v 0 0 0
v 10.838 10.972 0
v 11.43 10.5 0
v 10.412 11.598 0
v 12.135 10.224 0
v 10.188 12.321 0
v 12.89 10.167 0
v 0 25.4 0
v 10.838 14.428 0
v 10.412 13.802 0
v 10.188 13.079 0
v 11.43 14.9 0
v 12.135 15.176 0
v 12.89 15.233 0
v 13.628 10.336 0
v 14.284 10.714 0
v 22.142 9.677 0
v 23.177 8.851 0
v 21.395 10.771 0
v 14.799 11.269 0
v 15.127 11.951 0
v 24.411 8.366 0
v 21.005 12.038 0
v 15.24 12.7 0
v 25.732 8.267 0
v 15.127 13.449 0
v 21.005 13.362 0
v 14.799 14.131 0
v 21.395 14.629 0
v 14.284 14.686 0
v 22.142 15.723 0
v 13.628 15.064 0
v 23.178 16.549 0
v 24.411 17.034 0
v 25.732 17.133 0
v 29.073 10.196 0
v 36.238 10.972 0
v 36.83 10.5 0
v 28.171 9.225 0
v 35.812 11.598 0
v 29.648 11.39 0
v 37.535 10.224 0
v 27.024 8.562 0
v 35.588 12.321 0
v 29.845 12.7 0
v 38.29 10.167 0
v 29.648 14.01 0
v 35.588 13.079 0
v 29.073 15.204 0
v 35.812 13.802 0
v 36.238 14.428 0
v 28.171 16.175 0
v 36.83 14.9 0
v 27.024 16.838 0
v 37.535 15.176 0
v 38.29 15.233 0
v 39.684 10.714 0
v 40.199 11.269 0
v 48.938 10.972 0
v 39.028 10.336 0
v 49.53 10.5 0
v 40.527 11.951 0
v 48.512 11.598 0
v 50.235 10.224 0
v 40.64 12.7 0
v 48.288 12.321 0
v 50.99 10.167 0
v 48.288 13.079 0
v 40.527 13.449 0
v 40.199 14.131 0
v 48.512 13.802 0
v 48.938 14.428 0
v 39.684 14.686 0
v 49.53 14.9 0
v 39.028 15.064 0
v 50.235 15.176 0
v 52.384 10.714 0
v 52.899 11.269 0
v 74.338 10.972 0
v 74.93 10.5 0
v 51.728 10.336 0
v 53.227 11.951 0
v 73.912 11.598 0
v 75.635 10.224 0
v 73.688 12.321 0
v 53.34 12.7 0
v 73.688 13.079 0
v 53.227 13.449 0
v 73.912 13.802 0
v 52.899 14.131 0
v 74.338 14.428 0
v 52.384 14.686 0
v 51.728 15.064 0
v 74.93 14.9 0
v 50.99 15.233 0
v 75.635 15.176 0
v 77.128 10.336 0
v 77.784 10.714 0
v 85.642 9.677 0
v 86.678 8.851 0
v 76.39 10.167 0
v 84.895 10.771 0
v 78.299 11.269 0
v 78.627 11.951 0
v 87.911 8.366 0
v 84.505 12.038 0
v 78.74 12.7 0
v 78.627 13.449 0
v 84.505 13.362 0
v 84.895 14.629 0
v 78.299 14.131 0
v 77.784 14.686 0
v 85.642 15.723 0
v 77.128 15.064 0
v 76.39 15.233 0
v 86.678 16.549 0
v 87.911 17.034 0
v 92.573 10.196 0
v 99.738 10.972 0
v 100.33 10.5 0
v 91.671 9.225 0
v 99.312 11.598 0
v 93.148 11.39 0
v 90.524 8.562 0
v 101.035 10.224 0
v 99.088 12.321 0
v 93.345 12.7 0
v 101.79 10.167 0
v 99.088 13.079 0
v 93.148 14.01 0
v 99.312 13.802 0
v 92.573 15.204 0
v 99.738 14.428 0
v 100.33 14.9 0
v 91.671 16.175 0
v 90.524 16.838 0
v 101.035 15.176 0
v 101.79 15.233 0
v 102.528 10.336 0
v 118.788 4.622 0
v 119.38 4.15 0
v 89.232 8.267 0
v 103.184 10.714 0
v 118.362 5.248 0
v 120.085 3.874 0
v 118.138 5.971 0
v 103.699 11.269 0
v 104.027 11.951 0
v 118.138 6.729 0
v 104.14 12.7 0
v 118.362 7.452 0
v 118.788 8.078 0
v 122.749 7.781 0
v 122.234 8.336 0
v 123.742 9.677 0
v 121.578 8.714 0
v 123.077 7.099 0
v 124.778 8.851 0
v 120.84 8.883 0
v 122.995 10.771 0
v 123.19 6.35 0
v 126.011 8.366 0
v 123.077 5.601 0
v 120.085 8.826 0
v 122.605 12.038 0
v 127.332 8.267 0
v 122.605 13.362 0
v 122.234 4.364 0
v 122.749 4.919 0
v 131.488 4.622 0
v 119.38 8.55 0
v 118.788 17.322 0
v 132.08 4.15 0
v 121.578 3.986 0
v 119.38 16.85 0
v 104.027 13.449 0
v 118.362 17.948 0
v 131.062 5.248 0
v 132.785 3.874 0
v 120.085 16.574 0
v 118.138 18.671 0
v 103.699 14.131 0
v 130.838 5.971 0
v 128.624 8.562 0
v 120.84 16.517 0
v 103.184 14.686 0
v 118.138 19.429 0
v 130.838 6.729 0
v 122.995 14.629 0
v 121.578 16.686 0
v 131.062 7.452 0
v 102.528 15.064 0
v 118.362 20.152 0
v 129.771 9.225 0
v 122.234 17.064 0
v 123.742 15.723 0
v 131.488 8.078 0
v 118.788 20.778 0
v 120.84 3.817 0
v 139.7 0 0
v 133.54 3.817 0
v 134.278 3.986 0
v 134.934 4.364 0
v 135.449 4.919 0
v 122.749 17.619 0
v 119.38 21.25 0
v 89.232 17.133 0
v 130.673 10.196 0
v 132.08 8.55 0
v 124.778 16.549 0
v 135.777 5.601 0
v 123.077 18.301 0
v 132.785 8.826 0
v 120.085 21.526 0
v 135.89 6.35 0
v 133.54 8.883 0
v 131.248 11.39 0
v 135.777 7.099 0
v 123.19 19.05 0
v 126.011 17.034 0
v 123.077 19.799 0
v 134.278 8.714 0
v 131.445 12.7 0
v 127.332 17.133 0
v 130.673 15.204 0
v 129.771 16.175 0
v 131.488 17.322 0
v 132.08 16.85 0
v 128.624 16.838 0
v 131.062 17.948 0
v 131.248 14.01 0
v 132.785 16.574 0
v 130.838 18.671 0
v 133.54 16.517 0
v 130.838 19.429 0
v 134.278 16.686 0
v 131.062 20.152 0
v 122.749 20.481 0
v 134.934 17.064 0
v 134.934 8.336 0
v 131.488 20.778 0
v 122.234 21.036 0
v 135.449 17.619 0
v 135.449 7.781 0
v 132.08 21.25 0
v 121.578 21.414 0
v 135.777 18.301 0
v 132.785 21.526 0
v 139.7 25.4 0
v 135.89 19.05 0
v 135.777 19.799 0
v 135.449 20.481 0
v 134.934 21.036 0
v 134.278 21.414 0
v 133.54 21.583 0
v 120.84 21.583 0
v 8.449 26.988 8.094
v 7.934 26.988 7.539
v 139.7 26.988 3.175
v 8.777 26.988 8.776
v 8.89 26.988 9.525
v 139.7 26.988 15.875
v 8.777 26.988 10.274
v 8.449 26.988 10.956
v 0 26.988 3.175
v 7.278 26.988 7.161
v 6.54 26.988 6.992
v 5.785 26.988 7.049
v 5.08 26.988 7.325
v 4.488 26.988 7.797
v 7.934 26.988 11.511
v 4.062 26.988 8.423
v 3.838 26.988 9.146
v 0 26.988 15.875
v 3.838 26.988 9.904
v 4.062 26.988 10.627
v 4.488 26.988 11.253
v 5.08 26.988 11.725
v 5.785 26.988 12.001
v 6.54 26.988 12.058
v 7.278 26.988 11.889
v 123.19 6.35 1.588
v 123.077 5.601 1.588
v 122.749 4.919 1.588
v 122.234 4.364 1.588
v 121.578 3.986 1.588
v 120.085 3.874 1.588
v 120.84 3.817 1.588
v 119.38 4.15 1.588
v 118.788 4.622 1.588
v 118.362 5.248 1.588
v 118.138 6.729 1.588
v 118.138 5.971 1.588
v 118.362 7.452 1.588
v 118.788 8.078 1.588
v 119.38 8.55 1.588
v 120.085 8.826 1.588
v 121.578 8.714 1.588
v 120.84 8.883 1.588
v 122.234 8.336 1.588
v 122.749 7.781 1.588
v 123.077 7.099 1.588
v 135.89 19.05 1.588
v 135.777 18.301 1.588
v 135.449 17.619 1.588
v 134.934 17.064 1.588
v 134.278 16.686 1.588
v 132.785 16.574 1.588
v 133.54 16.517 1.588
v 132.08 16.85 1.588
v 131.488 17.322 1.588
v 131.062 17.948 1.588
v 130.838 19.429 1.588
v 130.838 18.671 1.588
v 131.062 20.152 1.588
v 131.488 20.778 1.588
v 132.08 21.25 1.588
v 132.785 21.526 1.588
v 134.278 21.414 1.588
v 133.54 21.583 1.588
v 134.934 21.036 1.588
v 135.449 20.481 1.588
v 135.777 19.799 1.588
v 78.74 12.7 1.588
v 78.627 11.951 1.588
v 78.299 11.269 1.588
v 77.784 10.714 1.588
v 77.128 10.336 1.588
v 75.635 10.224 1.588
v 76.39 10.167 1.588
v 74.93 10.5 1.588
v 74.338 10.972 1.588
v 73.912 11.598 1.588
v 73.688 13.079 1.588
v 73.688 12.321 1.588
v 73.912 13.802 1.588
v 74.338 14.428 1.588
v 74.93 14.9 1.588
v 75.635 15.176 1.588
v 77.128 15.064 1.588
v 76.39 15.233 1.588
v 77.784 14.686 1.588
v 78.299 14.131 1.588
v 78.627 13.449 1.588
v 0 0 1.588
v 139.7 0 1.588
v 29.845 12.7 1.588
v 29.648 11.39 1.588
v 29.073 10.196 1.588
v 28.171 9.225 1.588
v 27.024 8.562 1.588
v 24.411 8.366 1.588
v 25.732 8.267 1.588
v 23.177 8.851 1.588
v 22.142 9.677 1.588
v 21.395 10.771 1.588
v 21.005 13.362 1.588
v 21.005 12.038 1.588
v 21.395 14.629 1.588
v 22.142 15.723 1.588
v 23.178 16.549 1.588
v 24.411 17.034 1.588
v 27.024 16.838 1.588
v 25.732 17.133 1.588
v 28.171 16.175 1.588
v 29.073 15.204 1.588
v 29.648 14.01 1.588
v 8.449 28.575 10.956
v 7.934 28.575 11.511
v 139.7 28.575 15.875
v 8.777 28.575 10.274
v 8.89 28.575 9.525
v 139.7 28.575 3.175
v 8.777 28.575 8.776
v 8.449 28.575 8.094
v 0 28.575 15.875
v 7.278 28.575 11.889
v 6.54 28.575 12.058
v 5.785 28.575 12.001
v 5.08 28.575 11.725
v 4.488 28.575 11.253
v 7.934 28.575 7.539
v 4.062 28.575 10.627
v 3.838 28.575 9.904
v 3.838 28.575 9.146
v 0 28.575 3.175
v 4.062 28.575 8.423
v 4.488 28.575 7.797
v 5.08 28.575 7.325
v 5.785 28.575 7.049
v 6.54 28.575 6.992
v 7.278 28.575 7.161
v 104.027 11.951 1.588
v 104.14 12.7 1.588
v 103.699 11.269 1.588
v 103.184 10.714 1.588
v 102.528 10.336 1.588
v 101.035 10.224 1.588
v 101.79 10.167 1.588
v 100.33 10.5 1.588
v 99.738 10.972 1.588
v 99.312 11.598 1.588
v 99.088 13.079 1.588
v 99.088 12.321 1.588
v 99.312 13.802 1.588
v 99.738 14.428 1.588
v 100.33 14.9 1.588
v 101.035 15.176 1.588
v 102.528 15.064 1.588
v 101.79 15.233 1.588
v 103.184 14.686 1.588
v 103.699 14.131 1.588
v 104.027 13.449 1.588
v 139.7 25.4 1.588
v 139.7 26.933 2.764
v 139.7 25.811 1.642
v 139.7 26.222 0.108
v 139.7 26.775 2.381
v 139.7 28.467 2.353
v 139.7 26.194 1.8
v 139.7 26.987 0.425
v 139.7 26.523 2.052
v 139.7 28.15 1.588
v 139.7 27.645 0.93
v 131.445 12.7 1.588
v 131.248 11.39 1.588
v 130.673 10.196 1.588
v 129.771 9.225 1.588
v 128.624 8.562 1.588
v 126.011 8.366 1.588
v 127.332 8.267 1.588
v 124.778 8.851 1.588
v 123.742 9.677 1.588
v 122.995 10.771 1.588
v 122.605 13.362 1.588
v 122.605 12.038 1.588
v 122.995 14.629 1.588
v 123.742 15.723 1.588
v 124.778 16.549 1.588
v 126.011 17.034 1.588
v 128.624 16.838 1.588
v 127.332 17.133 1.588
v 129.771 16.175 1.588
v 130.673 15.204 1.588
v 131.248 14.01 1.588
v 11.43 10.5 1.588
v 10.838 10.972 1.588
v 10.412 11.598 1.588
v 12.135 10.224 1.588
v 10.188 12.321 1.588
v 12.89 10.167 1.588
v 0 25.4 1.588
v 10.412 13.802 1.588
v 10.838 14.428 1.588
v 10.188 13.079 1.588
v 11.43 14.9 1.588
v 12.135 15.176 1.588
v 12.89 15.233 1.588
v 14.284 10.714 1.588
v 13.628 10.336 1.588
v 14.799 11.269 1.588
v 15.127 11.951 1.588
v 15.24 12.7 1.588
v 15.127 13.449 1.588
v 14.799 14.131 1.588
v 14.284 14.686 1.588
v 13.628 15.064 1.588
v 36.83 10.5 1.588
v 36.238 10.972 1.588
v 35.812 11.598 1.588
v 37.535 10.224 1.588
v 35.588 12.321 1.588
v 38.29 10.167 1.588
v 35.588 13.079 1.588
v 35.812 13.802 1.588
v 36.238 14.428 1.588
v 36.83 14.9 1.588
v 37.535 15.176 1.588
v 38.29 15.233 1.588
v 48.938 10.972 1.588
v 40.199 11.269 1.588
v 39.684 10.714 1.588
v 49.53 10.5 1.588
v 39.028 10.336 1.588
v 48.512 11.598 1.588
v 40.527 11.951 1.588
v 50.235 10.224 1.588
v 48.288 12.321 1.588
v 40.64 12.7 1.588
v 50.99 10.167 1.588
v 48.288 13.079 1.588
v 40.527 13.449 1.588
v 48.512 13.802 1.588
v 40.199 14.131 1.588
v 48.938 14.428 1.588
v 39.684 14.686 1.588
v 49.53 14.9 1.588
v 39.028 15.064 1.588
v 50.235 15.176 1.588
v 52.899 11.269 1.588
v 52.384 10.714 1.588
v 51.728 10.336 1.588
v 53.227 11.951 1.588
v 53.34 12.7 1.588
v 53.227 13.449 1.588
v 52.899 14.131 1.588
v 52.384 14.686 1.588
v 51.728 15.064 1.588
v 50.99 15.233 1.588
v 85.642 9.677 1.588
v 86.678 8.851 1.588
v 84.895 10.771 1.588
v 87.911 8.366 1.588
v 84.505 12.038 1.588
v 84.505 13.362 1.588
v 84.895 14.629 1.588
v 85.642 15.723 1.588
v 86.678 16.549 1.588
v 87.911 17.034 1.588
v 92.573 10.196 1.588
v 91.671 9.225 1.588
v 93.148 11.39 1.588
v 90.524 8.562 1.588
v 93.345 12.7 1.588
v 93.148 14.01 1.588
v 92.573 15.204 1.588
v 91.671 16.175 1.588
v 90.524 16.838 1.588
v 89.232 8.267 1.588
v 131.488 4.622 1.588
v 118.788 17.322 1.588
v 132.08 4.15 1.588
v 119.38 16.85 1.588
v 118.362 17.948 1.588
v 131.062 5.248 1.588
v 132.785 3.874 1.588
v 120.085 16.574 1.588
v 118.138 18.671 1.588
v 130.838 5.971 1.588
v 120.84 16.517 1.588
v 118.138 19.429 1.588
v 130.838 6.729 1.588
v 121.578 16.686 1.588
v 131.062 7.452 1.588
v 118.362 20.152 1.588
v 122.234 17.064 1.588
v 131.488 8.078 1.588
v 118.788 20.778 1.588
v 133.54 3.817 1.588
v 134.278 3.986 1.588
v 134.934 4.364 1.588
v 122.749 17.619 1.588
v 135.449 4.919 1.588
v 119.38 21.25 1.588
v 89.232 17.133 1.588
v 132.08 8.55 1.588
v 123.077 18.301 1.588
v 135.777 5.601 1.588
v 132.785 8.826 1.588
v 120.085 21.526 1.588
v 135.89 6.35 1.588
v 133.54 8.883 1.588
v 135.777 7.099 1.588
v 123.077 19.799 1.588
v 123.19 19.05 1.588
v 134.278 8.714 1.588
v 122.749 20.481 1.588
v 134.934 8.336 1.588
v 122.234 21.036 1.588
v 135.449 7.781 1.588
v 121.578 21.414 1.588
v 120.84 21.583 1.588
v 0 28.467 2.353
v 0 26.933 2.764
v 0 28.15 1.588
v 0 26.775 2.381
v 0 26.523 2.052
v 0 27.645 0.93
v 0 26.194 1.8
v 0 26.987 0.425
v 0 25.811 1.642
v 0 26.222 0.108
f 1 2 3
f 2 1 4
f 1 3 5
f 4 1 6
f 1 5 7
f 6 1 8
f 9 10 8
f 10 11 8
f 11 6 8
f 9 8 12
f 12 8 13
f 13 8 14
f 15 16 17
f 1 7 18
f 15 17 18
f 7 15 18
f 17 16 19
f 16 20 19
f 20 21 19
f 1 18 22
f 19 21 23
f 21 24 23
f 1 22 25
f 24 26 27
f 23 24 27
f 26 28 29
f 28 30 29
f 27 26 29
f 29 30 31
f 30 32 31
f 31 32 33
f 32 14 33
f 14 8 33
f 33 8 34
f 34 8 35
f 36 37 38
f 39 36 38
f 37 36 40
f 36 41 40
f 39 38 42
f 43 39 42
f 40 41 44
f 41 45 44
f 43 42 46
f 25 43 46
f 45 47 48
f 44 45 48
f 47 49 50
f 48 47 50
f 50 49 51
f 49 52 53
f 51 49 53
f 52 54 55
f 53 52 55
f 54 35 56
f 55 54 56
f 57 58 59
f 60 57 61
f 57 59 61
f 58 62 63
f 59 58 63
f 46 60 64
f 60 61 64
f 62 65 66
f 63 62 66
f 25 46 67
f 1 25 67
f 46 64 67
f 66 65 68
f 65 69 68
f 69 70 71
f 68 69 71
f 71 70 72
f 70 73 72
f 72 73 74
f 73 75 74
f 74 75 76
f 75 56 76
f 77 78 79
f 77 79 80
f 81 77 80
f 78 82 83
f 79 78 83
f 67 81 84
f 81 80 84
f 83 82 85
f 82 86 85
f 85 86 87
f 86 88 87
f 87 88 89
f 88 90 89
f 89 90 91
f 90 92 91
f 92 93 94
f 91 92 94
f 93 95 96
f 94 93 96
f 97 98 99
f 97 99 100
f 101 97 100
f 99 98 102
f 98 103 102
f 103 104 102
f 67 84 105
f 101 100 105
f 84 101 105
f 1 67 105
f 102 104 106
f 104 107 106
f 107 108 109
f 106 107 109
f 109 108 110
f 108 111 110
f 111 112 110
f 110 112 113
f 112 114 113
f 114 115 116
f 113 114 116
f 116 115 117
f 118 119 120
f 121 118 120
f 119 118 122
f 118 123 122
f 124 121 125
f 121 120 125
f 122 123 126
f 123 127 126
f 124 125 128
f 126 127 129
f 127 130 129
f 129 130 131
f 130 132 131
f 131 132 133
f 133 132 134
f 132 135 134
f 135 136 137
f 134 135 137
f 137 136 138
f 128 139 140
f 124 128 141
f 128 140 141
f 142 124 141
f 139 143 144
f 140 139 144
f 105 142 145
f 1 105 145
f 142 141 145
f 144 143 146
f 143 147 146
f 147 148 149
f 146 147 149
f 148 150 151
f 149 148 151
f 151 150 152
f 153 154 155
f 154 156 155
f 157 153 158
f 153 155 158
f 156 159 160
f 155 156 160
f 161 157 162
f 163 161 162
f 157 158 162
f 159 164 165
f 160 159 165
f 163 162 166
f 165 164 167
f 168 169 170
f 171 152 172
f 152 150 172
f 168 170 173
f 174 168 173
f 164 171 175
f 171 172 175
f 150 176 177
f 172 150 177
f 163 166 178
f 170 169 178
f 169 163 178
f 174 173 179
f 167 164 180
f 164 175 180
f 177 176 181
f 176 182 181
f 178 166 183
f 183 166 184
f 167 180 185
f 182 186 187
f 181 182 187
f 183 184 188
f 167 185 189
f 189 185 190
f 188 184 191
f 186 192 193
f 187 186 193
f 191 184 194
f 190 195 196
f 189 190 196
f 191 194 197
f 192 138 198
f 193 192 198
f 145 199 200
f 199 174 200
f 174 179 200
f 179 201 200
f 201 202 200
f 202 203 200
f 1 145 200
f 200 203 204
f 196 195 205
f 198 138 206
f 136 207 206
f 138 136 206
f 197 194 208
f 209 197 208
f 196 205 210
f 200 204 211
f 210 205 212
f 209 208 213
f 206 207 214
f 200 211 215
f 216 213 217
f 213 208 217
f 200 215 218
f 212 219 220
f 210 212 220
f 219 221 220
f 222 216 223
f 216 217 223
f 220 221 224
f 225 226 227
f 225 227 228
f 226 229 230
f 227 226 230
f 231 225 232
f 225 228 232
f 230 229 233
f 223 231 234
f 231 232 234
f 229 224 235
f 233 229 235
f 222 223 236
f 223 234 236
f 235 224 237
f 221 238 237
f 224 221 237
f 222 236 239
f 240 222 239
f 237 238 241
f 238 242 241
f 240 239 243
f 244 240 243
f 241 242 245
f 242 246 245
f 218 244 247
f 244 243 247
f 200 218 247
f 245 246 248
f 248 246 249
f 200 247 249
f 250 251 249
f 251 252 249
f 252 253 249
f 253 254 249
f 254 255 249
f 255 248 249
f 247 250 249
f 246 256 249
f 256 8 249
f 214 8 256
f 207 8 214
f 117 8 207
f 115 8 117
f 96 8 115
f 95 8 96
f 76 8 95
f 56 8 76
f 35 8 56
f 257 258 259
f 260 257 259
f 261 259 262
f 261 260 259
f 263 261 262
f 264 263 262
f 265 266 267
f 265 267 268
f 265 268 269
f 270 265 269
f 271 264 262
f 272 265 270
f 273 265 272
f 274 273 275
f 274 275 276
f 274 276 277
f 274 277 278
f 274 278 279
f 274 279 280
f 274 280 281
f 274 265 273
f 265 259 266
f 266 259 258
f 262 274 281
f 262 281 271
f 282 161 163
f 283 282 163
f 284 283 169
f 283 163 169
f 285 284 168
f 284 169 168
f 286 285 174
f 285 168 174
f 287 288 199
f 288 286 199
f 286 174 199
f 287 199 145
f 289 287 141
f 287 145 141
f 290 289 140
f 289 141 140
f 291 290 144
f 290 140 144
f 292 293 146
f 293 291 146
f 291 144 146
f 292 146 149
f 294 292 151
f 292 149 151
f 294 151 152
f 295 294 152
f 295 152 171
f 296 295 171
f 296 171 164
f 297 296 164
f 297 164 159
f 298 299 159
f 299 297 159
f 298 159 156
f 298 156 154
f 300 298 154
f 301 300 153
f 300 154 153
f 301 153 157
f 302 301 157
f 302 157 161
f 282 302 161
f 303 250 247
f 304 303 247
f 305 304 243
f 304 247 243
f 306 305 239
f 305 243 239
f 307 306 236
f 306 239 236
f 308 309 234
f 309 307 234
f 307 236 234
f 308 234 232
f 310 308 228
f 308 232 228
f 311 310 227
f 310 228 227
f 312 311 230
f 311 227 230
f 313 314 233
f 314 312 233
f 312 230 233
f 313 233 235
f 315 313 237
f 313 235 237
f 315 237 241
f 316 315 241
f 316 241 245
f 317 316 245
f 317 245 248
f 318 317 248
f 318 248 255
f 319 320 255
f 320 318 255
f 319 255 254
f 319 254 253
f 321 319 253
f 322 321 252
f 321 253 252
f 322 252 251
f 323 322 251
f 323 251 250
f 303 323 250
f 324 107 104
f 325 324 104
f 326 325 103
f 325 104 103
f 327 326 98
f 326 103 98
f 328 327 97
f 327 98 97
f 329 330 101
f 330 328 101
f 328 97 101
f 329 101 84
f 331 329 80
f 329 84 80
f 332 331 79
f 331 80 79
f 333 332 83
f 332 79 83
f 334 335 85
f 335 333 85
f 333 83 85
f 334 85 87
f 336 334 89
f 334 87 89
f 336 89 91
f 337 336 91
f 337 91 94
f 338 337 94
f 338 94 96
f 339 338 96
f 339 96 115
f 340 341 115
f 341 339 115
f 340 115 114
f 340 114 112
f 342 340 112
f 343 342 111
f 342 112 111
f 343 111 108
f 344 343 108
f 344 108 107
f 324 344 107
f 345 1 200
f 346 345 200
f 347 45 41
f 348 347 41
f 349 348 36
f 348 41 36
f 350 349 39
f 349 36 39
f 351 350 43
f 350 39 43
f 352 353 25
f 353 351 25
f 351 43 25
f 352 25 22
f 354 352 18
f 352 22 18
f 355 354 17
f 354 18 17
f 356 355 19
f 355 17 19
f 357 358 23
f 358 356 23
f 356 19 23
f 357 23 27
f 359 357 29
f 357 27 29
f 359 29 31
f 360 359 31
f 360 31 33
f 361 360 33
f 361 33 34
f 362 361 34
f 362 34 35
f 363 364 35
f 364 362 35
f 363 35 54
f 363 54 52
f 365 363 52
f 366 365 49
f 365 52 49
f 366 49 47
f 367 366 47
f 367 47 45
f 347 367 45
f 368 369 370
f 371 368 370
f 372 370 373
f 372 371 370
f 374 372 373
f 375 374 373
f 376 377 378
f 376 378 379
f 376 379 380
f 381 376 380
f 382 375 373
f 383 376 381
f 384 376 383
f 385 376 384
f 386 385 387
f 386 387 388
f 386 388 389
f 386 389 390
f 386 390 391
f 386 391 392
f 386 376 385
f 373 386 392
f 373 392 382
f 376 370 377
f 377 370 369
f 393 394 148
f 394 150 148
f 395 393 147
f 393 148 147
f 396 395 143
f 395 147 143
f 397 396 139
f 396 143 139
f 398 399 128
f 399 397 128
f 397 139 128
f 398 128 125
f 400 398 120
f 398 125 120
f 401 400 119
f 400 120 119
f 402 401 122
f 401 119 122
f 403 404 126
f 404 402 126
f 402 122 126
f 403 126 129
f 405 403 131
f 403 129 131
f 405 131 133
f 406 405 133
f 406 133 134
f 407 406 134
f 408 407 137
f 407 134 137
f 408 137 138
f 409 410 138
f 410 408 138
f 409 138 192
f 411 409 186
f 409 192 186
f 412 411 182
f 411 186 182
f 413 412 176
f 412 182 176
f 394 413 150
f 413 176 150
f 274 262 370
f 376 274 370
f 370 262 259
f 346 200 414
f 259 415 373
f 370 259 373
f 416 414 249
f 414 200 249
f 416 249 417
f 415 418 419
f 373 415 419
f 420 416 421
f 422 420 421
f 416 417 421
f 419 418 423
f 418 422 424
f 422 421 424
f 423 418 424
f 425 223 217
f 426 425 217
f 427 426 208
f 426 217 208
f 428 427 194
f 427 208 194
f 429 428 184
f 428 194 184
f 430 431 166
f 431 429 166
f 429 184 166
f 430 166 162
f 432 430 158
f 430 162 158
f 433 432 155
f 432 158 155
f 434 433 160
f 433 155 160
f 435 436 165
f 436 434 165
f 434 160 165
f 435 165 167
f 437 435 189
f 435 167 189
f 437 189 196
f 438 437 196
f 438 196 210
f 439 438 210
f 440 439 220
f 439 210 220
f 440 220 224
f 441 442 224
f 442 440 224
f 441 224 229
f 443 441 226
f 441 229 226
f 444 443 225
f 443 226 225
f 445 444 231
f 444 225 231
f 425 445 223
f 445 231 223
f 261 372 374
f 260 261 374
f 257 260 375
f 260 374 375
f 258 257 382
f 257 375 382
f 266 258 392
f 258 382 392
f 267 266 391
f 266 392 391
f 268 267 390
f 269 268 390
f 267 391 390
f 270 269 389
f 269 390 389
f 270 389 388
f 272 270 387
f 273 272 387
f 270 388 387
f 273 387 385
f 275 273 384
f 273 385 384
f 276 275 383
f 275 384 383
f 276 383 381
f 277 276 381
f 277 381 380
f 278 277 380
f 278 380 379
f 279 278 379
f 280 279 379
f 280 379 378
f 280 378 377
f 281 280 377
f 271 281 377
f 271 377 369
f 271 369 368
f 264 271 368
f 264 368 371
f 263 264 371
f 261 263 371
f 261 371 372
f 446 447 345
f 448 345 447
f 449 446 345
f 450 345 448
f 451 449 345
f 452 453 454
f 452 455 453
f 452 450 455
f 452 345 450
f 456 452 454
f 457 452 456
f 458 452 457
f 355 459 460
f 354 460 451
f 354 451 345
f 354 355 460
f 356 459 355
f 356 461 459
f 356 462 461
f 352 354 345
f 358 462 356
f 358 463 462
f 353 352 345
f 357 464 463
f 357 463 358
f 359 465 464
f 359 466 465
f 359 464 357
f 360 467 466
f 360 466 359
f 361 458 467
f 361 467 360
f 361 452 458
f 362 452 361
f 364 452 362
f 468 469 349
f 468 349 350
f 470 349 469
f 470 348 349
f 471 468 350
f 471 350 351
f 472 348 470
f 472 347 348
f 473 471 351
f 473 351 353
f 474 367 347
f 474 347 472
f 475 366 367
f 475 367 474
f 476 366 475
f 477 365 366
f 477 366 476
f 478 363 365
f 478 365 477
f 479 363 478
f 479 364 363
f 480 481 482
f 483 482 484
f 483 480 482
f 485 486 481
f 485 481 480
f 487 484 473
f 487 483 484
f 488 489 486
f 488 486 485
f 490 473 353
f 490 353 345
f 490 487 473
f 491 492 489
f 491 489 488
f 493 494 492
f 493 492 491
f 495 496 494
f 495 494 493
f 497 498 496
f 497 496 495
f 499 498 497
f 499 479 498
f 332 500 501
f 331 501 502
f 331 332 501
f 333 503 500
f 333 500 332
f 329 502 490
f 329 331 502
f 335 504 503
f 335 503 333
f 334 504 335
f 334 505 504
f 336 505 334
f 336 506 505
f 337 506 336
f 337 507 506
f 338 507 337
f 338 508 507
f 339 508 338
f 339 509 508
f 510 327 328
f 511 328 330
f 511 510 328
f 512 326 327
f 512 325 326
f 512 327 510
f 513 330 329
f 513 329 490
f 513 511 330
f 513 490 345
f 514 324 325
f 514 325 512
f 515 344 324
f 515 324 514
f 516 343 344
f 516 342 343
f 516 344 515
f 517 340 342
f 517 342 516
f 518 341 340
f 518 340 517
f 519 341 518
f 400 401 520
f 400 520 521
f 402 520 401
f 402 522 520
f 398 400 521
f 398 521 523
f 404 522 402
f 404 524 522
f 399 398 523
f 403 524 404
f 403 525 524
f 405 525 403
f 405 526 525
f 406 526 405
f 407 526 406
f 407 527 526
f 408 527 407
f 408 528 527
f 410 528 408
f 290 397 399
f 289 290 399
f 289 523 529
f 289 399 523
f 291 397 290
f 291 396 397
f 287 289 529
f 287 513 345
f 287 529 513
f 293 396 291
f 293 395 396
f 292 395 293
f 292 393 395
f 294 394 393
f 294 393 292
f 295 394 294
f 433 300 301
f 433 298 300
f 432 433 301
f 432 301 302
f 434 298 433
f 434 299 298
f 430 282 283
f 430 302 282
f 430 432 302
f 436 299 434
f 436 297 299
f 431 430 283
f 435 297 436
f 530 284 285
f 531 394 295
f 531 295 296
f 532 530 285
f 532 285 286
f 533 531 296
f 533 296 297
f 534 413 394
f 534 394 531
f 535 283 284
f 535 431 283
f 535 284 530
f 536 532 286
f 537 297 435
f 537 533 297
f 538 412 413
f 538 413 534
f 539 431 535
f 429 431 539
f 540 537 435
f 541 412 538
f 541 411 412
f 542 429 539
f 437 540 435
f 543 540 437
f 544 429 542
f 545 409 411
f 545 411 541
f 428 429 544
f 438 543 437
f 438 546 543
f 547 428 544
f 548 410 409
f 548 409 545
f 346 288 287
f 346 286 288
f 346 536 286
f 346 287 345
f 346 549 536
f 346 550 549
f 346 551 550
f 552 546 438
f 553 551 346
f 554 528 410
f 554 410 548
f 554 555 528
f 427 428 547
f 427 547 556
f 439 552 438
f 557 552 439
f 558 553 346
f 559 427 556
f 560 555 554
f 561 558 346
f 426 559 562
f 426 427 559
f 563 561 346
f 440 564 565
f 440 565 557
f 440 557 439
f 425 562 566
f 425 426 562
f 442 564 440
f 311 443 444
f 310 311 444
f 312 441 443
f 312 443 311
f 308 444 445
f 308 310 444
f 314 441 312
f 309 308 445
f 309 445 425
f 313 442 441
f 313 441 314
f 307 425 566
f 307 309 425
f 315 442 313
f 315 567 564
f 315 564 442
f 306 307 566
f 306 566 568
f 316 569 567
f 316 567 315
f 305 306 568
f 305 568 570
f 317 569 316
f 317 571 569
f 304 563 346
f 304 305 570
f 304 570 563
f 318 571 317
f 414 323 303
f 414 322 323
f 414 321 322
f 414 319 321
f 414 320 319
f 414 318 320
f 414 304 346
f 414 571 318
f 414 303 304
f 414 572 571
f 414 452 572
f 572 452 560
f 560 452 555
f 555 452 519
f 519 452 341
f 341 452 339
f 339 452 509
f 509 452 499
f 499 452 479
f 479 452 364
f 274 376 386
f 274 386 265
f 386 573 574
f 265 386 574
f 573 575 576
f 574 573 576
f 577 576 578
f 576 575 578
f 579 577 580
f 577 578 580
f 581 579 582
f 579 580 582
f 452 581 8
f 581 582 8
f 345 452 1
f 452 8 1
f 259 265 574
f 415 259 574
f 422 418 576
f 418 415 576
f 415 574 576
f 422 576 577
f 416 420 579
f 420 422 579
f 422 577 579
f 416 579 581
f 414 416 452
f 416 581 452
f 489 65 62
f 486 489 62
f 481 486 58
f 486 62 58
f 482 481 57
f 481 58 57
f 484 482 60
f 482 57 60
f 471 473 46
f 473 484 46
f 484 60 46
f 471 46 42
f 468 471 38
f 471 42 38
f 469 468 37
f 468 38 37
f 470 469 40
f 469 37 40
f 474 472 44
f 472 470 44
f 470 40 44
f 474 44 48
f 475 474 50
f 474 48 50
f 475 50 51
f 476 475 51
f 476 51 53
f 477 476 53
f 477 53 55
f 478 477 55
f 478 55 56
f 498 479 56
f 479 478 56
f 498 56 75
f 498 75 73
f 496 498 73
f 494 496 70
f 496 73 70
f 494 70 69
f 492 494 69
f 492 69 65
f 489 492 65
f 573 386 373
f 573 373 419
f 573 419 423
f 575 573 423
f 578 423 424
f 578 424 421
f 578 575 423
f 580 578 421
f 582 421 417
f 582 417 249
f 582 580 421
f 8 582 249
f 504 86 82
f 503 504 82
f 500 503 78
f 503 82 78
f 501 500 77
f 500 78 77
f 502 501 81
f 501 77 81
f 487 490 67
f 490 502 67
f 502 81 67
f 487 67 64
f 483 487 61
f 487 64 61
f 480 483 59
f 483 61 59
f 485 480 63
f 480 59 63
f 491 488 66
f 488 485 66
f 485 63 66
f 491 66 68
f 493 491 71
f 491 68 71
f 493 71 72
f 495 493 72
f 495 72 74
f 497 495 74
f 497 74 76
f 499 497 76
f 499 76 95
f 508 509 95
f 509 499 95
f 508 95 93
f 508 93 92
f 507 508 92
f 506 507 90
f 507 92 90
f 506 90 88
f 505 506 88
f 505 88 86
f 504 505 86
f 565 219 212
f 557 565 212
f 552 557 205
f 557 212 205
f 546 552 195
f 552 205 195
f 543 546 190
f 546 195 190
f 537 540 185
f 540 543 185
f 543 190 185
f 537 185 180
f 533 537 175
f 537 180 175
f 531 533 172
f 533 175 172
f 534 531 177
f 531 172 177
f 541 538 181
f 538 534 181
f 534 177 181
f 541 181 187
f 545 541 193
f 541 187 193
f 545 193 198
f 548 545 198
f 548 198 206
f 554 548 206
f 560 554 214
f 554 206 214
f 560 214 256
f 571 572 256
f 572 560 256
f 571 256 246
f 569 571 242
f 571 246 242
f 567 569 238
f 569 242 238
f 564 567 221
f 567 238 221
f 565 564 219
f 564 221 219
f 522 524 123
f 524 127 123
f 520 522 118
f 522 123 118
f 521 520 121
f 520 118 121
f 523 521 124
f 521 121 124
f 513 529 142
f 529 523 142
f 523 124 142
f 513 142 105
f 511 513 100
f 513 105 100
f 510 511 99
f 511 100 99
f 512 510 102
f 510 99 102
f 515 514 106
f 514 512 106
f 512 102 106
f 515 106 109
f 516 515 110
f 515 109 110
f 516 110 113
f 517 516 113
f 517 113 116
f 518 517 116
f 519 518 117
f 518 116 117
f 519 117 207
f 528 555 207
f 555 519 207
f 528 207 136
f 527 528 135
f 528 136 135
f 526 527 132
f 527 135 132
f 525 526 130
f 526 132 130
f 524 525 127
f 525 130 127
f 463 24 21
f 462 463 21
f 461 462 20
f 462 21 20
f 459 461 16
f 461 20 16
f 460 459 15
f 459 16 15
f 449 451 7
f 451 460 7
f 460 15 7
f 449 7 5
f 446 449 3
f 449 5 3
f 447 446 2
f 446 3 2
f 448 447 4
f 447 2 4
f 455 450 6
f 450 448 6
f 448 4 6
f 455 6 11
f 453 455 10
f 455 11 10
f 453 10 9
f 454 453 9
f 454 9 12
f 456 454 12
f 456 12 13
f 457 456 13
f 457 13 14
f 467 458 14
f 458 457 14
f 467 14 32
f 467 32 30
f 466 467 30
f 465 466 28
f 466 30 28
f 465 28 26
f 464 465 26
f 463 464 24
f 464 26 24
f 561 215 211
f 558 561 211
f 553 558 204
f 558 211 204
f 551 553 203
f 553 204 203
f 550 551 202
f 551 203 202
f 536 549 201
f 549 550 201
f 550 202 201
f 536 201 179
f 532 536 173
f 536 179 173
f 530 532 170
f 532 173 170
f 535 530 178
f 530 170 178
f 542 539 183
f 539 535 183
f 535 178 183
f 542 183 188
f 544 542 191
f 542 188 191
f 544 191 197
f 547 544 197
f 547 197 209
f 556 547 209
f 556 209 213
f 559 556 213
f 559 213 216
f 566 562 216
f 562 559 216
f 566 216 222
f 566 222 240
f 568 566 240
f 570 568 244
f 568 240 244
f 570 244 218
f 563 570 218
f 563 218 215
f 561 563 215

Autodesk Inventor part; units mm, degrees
ref_plane "YZ Plane" through (0, 0, 0) normal (1, 0, 0) x (0, 1, 0)
ref_plane "XZ Plane" through (0, 0, 0) normal (0, 1, 0) x (-1, 0, 0)
ref_plane "XY Plane" through (0, 0, 0) normal (0, 0, 1) x (1, 0, 0)
sketch "Sketch1" plane through (0, 0, 0) normal (0, 0, 1) x (1, 0, 0)
  line L0 (0, 0) -> (139.7, 0)
  line L1 (139.7, 0) -> (139.7, 25.4)
  line L2 (139.7, 25.4) -> (0, 25.4)
  line L3 (0, 25.4) -> (0, 0)
  circle A0 centre (12.7, 12.7) radius 2.54
  circle A1 centre (25.4, 12.7) radius 4.445
  circle A2 centre (38.1, 12.7) radius 2.54
  circle A3 centre (50.8, 12.7) radius 2.54
  circle A4 centre (76.2, 12.7) radius 2.54
  circle A5 centre (88.9, 12.7) radius 4.445
  circle A6 centre (101.6, 12.7) radius 2.54
  circle A7 centre (127, 12.7) radius 4.445
  circle A8 centre (133.35, 6.35) radius 2.54
  circle A9 centre (120.65, 19.05) radius 2.54
  circle A10 centre (133.35, 19.05) radius 2.54
  circle A11 centre (120.65, 6.35) radius 2.54
  dimension "d0" = 139.7
  dimension "d1" = 25.4
  dimension "d9" = 5.08
  dimension "d11" = 8.89
  dimension "d13" = 5.08
  dimension "d15" = 5.08
  dimension "d17" = 5.08
  dimension "d19" = 8.89
  dimension "d21" = 5.08
  dimension "d23" = 8.89
  dimension "d39" = 5.08
  dimension "d42" = 5.08
  dimension "d43" = 5.08
  dimension "d44" = 5.08
extrude "Plate4" add sketch "Sketch1" along normal blind 1.5875
sketch "Sketch6" plane through (0, 26.9875, 3.175) normal (0, 1, 0) x (-1, 0, 0)
  line L0 (-139.7, 0) -> (0, 0)
  line L1 (0, 0) -> (0, 12.7)
  line L2 (0, 12.7) -> (-139.7, 12.7)
  line L3 (-139.7, 12.7) -> (-139.7, 0)
edge flange "Flange2" height 15.875 angle 90 thickness 1.5875 bend radius 1.5875 thickness toward (0, 1, 0) relief tear relief width 1.5875 relief depth 0.7937 edges at (69.85, 25.4, 1.5875) wall of the first edge with corners at (139.7, 26.9875, 3.175) (0, 26.9875, 3.175) (0, 26.9875, 15.875) (139.7, 26.9875, 15.875)
bend "Bend2"
corner "Corner2"
sketch "Sketch8" plane through (0, 28.575, 15.875) normal (0, 1, 0) x (1, 0, 0)
  line L0 (139.7, 12.7) -> (0, 12.7) projected
  line L1 (0, 12.7) -> (0, 6.35)
  line L2 (0, 0) -> (0, 12.7) projected
  line L3 (0, 6.35) -> (6.35, 6.35)
  circle A0 centre (6.35, 6.35) radius 2.54
  point P0 (0, 15.875)
  dimension "d69" = 6.35
  dimension "d70" = 5.08
extrude "Extrusion1" cut sketch "Sketch8" against normal blind 1.5875
equation "\"d58\" = Thickness"
equation "\"d59\" = BendReliefWidth"
equation "\"d60\" = BendReliefDepth"
equation "\"d61\" = MinimumRemnant"
equation "\"d62\" = TransitionRadius"
equation "\"d65\" = BendRadius"
equation "\"d66\" = CornerReliefSize"
equation "\"d67\" = GapSize"
equation "\"d68\" = JacobiRadiusSize"
equation "\"BendRadius\" = Thickness"
equation "\"BendReliefWidth\" = Thickness"
equation "\"BendReliefDepth\" = 0.5 * Thickness"
equation "\"CornerReliefSize\" = 4 * Thickness"
equation "\"MinimumRemnant\" = 2 * Thickness"
equation "\"TransitionRadius\" = BendRadius"
equation "\"JacobiRadiusSize\" = BendRadius"
equation "\"GapSize\" = Thickness"
equation "\"Thickness\" = 1.5875"
properties part number "poly1"
